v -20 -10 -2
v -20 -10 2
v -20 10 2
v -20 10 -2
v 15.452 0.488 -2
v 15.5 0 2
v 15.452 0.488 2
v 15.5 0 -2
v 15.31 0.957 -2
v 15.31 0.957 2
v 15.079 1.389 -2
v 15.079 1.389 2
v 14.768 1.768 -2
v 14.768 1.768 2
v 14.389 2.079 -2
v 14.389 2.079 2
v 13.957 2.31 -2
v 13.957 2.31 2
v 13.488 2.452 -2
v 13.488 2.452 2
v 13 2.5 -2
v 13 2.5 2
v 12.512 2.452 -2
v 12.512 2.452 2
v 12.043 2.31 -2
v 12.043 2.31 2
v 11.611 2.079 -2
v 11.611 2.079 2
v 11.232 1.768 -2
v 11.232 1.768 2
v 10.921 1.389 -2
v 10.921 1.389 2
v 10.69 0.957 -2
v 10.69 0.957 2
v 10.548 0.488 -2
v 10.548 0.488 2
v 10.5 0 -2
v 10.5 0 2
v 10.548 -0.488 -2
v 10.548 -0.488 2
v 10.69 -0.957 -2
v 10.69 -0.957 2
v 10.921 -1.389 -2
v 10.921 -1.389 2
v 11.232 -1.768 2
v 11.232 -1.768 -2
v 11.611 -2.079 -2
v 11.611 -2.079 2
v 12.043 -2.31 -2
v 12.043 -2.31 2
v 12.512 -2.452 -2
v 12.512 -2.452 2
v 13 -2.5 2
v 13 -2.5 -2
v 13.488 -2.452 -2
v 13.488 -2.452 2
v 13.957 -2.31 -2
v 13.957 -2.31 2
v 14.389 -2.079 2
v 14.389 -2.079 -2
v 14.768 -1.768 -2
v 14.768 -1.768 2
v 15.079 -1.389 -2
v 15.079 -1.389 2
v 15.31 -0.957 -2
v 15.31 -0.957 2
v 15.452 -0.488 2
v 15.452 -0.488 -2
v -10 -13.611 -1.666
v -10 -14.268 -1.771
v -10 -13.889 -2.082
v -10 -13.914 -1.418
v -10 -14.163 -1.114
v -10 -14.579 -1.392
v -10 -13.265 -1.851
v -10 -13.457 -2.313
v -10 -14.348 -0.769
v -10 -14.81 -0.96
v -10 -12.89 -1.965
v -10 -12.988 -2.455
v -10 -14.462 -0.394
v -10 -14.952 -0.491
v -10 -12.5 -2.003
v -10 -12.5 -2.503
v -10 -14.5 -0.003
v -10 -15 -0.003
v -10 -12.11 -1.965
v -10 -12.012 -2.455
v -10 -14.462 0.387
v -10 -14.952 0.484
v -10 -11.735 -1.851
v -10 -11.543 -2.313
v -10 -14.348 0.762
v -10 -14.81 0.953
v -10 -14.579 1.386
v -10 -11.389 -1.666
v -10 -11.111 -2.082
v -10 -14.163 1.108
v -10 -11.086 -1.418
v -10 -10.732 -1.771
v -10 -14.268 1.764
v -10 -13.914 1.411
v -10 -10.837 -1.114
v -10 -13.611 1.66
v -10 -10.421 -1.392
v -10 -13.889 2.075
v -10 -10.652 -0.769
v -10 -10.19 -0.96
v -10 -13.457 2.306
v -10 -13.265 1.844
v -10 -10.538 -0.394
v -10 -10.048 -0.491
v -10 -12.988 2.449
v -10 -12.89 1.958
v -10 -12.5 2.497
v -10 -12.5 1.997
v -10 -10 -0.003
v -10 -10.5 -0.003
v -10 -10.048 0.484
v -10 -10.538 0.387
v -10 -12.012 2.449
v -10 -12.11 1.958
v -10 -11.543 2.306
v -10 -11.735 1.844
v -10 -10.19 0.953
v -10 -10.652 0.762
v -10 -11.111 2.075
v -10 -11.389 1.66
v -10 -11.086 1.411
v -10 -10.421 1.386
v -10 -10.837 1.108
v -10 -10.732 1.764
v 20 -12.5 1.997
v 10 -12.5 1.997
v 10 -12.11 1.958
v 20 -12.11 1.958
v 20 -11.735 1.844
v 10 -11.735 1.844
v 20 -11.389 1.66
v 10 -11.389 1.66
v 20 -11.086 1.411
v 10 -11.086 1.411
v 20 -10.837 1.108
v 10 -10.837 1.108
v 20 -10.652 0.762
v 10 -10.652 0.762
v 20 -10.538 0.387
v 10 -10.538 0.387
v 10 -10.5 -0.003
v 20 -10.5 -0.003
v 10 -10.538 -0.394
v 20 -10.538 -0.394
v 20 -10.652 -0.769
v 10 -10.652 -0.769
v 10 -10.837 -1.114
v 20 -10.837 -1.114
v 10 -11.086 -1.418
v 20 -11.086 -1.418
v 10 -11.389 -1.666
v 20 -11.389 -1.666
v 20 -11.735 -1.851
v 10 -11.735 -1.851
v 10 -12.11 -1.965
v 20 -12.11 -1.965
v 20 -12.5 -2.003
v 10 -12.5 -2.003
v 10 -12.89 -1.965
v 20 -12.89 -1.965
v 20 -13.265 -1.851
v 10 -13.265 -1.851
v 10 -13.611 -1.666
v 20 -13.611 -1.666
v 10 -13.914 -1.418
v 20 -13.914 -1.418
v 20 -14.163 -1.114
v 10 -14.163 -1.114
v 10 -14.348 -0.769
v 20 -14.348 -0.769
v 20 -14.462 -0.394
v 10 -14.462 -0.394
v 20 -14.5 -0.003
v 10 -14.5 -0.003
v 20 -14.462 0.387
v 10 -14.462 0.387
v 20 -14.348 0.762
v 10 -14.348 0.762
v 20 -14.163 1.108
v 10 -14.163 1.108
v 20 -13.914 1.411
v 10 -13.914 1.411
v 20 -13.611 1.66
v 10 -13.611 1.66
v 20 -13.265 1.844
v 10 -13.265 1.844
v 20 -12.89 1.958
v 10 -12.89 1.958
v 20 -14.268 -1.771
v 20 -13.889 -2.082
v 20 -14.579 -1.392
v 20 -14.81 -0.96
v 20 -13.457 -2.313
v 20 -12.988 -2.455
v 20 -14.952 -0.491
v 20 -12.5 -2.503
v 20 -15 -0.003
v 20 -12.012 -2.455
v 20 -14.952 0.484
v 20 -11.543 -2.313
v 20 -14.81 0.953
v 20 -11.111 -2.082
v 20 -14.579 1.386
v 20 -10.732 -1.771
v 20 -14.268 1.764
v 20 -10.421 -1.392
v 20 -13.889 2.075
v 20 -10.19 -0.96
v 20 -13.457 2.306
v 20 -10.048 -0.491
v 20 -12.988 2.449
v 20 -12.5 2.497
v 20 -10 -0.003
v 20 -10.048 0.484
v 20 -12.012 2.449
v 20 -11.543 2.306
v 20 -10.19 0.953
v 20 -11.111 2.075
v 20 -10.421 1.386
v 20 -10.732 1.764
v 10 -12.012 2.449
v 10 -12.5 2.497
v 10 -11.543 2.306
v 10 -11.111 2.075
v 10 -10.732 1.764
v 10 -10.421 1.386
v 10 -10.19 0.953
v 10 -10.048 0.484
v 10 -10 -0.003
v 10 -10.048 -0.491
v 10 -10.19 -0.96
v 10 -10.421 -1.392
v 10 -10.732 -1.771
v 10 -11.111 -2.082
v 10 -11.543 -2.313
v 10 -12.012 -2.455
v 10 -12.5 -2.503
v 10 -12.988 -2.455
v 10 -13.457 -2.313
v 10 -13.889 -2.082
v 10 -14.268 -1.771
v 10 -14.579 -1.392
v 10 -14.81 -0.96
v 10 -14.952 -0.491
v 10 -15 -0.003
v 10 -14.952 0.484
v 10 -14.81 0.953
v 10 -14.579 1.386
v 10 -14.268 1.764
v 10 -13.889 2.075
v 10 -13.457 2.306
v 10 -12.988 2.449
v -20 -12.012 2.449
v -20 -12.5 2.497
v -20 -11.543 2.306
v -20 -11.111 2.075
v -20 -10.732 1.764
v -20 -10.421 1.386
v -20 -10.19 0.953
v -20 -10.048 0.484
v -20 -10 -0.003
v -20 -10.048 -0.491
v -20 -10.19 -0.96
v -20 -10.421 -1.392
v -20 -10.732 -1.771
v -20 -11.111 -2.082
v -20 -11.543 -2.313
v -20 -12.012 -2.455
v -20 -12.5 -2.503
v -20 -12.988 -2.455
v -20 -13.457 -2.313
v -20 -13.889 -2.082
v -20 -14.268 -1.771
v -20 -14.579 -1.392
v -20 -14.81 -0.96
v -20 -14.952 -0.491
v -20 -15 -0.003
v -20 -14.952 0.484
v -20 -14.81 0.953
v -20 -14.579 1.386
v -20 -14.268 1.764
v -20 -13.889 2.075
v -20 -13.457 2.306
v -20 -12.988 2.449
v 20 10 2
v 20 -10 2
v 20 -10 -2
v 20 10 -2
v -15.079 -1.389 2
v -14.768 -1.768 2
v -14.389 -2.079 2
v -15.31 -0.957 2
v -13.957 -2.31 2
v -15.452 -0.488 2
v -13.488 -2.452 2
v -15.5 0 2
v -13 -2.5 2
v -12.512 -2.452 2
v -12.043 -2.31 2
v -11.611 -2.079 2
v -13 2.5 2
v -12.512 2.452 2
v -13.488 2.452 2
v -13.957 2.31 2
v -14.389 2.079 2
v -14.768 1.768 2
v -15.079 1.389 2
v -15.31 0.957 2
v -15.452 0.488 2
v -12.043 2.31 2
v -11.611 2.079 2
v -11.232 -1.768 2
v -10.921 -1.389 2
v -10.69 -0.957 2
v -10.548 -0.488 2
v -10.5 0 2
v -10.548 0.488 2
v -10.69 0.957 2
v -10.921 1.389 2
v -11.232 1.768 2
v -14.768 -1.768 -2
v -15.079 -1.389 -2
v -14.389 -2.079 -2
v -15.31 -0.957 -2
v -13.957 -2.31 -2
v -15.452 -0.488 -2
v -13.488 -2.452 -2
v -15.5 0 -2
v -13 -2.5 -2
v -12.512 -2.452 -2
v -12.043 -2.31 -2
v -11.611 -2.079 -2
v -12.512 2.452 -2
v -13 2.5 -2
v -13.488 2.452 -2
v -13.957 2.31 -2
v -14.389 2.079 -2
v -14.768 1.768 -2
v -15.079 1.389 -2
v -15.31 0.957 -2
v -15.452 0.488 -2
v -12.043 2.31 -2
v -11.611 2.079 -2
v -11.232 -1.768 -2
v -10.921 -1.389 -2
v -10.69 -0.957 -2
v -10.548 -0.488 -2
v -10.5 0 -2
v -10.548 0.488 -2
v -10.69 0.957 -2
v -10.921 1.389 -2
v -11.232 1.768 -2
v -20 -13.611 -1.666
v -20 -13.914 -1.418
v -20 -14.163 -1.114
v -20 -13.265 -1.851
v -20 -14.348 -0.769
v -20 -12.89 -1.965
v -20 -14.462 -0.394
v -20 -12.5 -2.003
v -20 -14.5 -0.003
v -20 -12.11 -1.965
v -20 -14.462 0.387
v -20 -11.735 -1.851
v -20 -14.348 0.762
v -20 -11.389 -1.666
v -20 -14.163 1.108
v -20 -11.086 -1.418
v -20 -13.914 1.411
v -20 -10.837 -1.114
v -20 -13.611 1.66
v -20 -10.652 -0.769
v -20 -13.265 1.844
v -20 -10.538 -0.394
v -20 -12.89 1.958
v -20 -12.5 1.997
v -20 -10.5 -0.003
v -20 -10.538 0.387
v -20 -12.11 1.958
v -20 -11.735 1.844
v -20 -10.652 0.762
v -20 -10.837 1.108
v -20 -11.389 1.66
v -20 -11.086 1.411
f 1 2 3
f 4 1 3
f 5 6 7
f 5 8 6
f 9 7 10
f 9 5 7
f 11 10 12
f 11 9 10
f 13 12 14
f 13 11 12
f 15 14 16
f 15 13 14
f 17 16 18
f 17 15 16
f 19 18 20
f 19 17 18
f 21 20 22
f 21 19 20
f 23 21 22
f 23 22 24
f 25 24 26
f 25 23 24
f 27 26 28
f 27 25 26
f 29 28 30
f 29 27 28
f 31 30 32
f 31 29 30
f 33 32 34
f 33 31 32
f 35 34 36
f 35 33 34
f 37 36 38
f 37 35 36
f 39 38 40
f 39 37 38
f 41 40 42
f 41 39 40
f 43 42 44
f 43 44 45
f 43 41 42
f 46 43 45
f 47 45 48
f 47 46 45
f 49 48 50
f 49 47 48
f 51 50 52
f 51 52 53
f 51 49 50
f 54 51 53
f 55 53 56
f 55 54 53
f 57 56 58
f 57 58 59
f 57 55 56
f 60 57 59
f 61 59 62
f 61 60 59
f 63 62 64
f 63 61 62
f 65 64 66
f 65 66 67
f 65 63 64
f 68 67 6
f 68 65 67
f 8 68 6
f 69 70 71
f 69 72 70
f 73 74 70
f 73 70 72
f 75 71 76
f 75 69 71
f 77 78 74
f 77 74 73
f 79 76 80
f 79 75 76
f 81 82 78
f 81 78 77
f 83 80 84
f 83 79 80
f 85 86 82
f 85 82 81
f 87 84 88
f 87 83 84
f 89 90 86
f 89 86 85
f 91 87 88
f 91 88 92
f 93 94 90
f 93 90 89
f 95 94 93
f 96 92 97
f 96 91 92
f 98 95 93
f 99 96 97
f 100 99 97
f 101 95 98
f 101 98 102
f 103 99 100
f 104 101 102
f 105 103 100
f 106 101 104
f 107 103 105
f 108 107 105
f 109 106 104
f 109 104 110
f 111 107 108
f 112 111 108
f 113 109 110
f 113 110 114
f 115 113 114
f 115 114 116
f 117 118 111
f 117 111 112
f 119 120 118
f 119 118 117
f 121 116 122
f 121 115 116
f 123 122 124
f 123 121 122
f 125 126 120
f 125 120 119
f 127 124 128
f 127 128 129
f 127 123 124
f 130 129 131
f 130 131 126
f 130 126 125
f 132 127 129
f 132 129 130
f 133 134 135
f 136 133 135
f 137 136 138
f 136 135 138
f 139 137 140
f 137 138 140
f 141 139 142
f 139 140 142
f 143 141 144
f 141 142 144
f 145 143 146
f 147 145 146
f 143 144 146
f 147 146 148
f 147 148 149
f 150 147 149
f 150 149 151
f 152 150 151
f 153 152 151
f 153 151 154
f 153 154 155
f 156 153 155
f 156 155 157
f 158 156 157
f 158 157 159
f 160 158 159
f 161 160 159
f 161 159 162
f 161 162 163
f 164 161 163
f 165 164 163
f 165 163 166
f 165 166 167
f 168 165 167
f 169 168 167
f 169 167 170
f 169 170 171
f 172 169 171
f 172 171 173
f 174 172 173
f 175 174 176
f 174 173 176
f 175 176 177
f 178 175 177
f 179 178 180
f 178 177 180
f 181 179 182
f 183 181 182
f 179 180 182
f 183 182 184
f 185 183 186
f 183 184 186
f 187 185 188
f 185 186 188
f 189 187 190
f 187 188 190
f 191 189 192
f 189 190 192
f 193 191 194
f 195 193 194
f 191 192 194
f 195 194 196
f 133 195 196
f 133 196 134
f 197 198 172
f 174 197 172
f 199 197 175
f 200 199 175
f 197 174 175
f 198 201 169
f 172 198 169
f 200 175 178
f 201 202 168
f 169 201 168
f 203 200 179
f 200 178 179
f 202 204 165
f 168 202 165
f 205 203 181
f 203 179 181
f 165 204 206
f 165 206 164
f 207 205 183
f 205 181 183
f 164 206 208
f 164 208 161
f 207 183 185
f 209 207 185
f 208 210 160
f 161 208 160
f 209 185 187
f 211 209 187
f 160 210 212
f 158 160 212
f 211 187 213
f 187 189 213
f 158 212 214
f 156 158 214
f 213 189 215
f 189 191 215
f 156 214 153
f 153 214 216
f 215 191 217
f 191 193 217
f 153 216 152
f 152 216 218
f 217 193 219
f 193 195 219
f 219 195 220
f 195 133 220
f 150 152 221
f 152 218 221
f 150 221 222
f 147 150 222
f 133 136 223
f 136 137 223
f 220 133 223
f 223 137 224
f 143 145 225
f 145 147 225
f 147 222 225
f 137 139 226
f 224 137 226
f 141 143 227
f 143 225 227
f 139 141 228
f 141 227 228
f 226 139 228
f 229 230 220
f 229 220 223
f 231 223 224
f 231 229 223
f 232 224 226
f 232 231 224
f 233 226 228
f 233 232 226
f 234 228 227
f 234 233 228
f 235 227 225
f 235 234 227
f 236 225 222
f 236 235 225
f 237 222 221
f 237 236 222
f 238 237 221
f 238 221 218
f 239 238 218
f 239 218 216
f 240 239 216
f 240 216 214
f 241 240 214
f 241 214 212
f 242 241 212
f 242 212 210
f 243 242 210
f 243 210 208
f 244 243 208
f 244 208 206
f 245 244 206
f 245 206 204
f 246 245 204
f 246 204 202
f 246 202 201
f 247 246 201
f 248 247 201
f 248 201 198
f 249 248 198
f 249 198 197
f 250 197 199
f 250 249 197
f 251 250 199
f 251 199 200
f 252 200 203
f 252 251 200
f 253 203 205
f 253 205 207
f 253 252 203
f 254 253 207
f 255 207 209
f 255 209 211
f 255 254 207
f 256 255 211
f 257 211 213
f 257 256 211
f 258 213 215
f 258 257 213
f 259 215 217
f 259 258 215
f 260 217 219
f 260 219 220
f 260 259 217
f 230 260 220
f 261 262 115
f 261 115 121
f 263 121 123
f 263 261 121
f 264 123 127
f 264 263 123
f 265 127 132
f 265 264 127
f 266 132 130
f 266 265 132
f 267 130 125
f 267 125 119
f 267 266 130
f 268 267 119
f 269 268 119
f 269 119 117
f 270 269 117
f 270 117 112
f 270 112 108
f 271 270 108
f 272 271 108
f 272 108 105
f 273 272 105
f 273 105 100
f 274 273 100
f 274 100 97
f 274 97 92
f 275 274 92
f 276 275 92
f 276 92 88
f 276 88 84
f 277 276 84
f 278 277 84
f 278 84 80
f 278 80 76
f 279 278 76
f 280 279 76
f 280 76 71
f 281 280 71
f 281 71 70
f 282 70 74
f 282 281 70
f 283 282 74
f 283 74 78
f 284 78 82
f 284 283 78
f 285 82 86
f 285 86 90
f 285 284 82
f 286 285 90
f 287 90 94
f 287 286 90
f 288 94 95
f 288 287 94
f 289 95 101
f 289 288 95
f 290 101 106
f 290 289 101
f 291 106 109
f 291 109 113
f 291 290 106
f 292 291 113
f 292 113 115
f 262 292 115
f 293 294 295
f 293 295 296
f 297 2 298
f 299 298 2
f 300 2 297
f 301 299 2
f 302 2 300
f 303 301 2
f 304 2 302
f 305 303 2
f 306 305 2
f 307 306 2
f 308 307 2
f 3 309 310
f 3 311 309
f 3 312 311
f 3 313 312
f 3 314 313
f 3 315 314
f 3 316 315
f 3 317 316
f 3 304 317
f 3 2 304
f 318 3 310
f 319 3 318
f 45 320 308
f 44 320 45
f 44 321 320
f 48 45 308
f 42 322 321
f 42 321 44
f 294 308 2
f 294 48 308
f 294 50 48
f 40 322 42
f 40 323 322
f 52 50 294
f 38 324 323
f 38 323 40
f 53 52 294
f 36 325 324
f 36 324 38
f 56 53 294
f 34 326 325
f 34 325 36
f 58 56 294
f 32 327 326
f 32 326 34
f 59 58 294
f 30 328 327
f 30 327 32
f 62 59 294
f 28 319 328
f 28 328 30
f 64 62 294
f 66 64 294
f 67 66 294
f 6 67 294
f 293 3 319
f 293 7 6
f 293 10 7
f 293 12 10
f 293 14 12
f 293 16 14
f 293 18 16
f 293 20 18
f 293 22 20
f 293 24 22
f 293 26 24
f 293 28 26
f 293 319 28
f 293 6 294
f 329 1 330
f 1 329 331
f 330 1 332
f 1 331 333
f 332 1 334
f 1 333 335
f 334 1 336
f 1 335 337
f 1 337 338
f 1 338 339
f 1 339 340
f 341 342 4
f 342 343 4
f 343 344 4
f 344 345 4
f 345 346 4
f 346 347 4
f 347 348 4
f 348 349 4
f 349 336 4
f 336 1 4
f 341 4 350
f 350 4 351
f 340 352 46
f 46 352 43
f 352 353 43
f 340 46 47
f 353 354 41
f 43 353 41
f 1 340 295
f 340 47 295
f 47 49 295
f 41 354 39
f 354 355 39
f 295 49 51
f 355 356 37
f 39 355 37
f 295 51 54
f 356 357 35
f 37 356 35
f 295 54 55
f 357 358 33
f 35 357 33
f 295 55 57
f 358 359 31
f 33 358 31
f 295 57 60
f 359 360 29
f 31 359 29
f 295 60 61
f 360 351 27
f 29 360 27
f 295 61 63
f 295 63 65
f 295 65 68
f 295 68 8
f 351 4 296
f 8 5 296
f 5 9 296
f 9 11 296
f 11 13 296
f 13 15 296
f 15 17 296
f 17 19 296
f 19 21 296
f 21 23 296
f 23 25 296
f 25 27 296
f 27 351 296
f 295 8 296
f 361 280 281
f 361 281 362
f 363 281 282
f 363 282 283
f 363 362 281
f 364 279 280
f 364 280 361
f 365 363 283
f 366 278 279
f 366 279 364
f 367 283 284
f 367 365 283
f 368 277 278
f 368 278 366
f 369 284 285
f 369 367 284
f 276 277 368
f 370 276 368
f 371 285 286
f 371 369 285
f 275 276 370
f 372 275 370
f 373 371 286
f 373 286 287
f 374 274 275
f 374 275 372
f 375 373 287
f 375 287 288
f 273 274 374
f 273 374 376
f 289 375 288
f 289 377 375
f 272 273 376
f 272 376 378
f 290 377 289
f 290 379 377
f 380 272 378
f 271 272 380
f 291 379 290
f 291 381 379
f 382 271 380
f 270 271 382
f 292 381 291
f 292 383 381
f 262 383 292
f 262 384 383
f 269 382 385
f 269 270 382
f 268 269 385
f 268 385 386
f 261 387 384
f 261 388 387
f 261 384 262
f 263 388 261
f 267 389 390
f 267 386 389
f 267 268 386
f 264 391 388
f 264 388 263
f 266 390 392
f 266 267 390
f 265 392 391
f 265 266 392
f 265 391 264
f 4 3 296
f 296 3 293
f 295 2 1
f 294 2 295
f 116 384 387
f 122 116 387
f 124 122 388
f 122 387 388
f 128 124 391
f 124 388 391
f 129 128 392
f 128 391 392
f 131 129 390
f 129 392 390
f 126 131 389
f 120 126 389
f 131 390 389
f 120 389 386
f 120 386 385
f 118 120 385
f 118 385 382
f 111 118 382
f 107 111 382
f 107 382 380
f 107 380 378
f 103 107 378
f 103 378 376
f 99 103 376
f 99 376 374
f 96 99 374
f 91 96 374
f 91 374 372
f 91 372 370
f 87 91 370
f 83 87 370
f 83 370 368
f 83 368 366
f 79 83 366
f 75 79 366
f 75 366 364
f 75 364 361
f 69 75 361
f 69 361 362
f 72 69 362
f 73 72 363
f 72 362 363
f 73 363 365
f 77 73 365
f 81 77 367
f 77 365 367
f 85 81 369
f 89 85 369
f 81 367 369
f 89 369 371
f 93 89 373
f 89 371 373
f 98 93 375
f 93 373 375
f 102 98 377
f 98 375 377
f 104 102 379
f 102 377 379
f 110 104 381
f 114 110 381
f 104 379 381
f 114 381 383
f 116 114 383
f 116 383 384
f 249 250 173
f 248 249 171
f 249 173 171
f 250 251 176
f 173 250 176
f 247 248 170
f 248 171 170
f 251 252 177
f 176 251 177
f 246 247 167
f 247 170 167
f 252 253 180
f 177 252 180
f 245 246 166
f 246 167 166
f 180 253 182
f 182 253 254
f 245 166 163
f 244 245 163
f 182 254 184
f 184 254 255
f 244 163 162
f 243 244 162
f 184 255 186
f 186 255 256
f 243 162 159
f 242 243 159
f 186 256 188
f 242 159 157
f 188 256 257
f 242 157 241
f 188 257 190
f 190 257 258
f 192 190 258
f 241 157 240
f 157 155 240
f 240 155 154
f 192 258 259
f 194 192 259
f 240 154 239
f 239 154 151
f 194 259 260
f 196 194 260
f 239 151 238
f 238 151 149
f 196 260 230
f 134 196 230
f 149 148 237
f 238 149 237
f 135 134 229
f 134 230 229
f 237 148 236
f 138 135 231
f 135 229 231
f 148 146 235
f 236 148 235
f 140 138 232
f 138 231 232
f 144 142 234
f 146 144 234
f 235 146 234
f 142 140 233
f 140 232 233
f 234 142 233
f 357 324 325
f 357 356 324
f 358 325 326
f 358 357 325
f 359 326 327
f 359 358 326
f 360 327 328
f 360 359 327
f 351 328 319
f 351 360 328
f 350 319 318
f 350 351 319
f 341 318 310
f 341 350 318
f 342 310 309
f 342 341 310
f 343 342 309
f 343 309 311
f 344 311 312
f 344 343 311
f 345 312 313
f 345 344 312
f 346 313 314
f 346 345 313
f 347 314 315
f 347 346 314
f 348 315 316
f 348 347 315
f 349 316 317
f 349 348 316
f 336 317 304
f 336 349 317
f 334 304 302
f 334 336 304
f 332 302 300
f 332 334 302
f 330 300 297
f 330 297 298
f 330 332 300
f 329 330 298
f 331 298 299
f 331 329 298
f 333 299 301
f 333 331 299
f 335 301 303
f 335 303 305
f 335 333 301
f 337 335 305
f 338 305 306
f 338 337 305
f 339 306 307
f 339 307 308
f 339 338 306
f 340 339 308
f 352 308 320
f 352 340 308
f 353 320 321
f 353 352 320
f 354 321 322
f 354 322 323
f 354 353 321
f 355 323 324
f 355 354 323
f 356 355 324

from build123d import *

# Parameters (mm, degrees)
SKETCH1_W           = 40
SKETCH1_H           = 20
SKETCH1_R           = 2.5
BOSS_EXTRUDE1_DEPTH = 2
SKETCH3_R           = 2.5
SKETCH3_R_2         = 2
BOSS_EXTRUDE2_DEPTH = 40
SKETCH4_W           = 20
SKETCH4_H           = 5.18072448
CUT_EXTRUDE1_DEPTH  = 5


with BuildPart() as part:
    # Sketch1 → Boss-Extrude1 (new body, symmetric)
    with BuildSketch(Plane.XY):
        Rectangle(SKETCH1_W, SKETCH1_H)
        with Locations((-13, 0)):
            Circle(SKETCH1_R, mode=Mode.SUBTRACT)
        with Locations((13, 0)):
            Circle(SKETCH1_R, mode=Mode.SUBTRACT)
    extrude(amount=BOSS_EXTRUDE1_DEPTH, both=True)


with BuildPart() as body_2:
    # Sketch3 → Boss-Extrude2 (new body)
    with BuildSketch(Plane.ZY.offset(20)):
        with Locations((-0.003340528, -12.5)):
            Circle(SKETCH3_R)
        with Locations((-0.003340528, -12.5)):
            Circle(SKETCH3_R_2, mode=Mode.SUBTRACT)
    extrude(amount=-BOSS_EXTRUDE2_DEPTH)

    # Sketch4 → Cut-Extrude1 (cut, symmetric)
    with BuildSketch(Plane.XY.offset(2)):
        with Locations((0, -12.59036224)):
            Rectangle(SKETCH4_W, SKETCH4_H)
    extrude(amount=CUT_EXTRUDE1_DEPTH, both=True, mode=Mode.SUBTRACT)


solid = Compound([part.part, body_2.part])
